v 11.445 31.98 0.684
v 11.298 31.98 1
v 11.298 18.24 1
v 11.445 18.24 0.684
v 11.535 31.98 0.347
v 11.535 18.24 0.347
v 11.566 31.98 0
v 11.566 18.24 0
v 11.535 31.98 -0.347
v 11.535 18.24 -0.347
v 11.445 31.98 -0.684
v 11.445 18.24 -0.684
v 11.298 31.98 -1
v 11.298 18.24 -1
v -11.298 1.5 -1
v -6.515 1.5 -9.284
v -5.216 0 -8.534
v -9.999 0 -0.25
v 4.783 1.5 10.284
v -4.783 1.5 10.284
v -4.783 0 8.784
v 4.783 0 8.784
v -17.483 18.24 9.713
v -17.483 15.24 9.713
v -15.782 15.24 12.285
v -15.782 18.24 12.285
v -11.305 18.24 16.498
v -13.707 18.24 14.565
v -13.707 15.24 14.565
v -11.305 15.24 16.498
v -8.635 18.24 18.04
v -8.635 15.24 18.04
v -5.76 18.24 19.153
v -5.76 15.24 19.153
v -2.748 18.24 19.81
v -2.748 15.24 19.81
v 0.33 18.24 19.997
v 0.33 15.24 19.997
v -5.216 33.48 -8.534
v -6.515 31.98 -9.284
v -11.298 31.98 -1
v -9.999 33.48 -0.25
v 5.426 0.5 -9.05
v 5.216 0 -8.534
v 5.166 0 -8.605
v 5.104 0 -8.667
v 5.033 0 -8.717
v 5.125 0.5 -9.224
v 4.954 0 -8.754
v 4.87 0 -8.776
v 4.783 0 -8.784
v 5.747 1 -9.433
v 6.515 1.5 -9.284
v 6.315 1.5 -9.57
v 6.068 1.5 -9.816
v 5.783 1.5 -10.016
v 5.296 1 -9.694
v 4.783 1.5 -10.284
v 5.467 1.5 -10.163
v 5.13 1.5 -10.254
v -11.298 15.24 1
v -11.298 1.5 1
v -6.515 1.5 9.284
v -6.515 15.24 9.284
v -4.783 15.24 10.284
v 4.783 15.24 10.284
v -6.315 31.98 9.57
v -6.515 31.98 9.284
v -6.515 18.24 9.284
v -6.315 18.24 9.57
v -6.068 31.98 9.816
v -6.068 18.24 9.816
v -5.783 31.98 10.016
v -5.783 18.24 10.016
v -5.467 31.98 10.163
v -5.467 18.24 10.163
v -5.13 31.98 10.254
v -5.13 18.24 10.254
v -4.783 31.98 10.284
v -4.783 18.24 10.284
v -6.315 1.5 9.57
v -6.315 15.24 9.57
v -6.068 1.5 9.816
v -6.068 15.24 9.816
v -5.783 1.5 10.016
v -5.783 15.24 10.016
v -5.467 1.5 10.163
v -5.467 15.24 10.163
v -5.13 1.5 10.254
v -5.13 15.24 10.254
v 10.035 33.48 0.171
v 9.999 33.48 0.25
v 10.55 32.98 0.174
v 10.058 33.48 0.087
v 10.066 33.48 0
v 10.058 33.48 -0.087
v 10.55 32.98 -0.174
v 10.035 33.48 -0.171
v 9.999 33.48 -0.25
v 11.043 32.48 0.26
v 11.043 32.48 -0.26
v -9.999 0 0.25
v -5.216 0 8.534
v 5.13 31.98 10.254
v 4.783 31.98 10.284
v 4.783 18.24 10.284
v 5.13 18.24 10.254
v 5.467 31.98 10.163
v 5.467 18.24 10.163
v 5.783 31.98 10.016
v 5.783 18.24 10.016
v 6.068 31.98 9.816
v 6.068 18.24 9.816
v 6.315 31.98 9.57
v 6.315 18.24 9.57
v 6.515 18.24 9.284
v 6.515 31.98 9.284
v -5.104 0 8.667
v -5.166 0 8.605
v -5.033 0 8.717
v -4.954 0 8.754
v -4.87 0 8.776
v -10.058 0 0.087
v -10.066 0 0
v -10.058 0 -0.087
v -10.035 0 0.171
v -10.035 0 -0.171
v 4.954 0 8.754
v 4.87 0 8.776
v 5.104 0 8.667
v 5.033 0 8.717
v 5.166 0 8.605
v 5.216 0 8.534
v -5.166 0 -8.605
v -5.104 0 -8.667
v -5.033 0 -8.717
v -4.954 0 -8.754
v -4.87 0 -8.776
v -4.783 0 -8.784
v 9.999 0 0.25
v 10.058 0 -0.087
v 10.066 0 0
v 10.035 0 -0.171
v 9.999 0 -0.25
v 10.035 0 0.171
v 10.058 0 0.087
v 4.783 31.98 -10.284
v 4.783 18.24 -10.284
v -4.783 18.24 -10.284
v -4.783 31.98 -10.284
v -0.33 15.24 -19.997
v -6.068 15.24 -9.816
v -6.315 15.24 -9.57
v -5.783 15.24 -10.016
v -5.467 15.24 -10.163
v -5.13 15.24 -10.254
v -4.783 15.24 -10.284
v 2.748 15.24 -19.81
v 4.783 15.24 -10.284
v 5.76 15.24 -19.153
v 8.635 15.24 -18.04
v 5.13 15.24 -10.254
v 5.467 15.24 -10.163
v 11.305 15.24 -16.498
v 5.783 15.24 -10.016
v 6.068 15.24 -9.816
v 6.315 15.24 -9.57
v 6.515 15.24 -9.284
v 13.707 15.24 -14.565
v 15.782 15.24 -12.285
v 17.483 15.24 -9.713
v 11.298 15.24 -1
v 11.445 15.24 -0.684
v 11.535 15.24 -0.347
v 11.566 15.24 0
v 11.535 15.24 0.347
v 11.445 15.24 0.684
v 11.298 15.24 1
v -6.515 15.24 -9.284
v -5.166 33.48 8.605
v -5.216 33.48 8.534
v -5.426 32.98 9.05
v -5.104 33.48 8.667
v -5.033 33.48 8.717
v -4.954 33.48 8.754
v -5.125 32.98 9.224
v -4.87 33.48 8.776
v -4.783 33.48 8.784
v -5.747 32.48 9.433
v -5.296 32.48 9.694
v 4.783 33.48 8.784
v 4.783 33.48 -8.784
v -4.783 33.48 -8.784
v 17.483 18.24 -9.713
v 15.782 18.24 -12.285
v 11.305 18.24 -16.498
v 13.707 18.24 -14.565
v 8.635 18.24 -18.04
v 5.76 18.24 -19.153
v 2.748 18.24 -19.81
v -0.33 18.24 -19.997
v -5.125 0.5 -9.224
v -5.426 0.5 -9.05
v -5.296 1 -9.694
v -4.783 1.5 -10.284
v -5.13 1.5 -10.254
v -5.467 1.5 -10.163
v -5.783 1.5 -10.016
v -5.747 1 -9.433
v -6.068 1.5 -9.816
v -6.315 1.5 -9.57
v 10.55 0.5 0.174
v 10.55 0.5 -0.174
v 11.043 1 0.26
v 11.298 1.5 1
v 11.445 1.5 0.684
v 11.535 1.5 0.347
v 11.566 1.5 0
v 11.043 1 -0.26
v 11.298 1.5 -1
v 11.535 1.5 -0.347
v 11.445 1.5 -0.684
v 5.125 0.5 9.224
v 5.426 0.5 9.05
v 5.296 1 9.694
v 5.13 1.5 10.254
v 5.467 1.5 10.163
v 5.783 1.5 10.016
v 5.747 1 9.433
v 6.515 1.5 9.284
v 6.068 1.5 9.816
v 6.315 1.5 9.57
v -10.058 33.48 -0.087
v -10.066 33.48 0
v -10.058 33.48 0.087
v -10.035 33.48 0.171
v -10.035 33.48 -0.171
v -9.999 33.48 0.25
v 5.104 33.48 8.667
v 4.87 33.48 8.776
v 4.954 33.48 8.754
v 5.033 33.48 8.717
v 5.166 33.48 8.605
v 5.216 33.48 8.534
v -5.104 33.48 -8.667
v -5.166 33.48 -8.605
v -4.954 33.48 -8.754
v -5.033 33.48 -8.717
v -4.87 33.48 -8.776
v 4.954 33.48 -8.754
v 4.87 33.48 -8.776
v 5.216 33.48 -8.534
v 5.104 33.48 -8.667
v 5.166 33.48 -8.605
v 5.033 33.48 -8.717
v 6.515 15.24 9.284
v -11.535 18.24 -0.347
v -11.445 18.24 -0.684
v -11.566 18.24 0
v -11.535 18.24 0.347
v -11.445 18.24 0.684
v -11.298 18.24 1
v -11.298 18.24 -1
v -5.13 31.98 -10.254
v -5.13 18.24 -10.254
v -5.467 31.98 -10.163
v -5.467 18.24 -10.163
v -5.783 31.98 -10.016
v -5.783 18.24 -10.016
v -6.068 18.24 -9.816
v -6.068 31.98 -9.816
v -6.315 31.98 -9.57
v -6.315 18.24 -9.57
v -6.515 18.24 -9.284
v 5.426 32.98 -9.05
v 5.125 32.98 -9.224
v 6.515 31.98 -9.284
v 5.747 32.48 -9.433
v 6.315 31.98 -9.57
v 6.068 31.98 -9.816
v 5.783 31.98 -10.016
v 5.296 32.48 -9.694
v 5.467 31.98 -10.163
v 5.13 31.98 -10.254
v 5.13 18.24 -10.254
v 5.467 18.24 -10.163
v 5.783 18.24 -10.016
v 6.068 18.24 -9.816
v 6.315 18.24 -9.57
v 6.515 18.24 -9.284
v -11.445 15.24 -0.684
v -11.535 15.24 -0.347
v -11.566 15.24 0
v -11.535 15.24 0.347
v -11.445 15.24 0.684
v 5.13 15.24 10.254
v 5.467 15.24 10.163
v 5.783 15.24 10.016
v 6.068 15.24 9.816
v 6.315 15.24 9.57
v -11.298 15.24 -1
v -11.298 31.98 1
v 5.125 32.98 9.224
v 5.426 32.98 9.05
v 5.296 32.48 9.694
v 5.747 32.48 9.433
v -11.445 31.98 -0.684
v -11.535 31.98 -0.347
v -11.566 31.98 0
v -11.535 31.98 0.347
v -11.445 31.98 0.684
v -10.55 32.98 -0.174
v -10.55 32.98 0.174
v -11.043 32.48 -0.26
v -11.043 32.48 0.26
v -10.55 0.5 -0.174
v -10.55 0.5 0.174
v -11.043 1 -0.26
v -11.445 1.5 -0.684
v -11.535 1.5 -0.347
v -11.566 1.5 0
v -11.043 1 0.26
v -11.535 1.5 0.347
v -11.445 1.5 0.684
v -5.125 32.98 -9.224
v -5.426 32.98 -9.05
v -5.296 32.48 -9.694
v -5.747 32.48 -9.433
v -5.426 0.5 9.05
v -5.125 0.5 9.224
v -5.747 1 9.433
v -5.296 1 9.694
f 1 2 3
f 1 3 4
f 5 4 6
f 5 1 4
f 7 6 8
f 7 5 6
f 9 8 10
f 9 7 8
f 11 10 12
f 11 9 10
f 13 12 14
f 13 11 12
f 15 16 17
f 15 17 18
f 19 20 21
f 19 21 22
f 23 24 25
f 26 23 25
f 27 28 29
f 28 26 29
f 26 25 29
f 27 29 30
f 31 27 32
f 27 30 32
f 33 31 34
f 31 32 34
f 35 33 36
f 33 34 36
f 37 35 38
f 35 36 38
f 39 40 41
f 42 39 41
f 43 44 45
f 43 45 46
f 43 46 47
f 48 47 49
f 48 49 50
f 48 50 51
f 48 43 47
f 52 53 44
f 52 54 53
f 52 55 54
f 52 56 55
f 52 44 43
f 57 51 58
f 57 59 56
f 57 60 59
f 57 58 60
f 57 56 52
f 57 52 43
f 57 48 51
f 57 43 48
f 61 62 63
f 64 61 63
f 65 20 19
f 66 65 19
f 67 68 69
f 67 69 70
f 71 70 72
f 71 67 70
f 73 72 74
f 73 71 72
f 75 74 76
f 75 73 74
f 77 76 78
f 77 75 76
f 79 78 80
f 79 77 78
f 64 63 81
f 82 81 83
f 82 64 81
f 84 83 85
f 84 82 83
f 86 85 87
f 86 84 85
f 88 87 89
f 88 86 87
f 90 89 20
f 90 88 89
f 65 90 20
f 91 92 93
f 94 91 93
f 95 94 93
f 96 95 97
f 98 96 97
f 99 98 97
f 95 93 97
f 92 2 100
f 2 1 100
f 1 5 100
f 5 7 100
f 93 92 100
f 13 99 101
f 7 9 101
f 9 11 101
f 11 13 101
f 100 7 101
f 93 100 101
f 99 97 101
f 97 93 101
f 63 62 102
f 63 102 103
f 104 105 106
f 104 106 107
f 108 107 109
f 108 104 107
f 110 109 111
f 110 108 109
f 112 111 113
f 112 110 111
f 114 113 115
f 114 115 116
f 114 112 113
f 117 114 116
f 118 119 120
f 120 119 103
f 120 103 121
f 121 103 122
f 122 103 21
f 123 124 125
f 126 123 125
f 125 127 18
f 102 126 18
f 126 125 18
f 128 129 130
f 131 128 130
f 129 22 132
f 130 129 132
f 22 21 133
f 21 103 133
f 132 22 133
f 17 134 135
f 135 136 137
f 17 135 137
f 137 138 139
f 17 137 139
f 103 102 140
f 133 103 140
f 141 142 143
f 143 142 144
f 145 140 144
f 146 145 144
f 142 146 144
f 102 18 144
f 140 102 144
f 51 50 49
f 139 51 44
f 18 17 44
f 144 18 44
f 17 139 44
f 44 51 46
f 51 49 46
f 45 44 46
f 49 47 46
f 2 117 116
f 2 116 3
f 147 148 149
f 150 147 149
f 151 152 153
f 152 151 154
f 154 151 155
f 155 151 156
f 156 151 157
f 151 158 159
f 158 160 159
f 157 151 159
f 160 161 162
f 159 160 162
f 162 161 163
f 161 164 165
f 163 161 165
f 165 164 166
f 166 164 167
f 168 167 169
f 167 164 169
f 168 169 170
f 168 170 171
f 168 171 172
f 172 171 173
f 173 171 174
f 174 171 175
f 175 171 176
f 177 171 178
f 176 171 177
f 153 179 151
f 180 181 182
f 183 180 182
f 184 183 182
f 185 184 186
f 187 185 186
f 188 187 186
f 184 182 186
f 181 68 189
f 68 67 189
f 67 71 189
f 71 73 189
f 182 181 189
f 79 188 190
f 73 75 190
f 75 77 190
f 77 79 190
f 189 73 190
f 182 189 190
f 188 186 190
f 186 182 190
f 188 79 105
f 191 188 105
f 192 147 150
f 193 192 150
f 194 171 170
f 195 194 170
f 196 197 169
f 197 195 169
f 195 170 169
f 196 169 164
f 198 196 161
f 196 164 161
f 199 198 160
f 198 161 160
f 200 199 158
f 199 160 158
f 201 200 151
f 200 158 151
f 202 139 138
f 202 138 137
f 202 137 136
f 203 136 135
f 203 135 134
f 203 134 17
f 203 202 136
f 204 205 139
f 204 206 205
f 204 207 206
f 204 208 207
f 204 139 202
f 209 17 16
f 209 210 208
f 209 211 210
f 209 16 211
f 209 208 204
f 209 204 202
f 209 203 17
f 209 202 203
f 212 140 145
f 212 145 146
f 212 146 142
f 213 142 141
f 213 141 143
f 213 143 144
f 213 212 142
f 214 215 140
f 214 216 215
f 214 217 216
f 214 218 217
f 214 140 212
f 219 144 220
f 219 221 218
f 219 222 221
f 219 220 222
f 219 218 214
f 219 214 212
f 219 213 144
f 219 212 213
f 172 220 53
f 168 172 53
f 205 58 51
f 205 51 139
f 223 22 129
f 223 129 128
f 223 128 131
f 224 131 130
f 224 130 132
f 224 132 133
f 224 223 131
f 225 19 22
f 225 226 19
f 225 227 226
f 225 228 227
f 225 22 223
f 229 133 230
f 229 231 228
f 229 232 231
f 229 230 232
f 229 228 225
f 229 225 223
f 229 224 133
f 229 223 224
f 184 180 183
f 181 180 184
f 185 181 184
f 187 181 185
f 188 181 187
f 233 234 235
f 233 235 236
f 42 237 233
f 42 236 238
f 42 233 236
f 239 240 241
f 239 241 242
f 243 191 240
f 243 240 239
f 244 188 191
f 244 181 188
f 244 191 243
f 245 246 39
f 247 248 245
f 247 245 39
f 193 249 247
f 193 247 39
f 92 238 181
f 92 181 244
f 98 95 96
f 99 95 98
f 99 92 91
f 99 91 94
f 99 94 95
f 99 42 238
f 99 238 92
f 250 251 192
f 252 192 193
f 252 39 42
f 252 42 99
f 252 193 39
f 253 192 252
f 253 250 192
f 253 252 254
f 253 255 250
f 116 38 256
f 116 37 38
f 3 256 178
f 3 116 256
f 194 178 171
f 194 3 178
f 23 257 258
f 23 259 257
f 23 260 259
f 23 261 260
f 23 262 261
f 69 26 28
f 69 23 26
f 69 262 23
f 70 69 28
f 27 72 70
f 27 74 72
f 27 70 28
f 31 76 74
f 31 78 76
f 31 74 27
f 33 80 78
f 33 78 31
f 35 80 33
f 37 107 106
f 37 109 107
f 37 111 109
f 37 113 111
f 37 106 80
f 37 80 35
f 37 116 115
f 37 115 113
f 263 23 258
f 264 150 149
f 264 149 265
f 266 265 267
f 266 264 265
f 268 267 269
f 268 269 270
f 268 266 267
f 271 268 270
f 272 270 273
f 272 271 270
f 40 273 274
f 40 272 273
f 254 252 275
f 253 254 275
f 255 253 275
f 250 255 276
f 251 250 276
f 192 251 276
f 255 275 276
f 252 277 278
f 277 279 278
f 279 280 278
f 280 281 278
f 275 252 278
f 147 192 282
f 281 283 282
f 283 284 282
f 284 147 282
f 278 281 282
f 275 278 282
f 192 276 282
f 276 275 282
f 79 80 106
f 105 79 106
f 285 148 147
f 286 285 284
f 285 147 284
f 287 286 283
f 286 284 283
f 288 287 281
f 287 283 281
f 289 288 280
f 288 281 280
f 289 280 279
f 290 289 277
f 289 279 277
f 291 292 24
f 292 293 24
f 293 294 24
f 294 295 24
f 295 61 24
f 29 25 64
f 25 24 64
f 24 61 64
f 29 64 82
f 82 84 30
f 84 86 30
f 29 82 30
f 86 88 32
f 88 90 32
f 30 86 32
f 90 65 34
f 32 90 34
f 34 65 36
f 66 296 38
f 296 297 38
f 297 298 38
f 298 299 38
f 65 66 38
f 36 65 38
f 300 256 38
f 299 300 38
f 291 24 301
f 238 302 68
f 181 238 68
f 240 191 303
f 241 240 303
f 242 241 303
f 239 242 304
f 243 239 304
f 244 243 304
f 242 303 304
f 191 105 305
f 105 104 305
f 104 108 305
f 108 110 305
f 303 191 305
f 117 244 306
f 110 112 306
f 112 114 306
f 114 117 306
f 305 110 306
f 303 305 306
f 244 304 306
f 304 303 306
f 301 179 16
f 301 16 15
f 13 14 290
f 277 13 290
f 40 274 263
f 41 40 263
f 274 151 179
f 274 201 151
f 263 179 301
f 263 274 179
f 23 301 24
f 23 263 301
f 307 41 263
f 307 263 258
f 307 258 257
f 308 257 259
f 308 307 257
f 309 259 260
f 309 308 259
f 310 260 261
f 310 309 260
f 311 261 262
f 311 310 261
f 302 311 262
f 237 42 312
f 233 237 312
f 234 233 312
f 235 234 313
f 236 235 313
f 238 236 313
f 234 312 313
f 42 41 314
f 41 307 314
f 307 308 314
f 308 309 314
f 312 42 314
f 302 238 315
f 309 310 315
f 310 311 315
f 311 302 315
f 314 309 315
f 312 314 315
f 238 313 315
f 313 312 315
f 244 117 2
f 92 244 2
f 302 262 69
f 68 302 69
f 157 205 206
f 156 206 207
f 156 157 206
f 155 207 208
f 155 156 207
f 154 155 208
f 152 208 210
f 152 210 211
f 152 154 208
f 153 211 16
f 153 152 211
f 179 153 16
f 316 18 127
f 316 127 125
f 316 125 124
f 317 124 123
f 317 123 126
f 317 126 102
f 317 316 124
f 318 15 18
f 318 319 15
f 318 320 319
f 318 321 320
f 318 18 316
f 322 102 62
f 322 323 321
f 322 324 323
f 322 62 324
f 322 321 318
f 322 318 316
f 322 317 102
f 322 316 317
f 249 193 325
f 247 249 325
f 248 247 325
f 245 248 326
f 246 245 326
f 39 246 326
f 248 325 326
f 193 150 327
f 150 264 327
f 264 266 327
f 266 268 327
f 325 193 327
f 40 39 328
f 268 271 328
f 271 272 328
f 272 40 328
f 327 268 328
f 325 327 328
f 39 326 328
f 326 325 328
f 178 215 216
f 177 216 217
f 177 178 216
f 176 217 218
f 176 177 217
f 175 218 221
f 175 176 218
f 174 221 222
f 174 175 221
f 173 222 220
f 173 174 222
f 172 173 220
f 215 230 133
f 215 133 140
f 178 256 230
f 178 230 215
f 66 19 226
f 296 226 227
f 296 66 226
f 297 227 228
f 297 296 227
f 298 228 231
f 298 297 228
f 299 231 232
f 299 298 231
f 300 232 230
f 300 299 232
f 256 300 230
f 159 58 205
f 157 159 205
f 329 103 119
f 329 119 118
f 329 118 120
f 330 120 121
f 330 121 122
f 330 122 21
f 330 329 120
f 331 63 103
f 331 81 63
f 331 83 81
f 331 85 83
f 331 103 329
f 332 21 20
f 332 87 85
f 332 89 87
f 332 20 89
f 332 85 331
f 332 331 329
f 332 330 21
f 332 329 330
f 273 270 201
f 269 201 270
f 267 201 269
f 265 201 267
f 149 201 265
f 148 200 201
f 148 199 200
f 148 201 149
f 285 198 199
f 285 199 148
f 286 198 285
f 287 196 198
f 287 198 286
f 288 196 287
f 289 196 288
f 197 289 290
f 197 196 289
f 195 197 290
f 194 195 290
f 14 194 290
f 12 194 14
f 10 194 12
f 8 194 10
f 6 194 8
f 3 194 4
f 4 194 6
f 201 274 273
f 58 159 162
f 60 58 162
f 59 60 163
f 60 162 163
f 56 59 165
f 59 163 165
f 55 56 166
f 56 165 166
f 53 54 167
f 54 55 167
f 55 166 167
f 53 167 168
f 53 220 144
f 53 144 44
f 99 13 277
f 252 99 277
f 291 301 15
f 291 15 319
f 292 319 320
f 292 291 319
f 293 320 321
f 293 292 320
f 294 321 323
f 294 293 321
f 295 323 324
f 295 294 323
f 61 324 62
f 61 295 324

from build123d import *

# Parameters (mm, degrees)
BOSS_EXTRUDE1_DEPTH = 15.24
SKETCH2_R           = 20
BOSS_EXTRUDE2_DEPTH = 3
BOSS_EXTRUDE3_START = 18.24
BOSS_EXTRUDE3_DEPTH = 15.24
FILLET1_R           = 2
SKETCH3_W           = 35.8896148
SKETCH3_H           = 21.37412809
CUT_EXTRUDE1_DEPTH  = 51.878317112
CHAMFER2_SIZE       = 1.5
SKETCH5_W           = 51.439810339
SKETCH5_H           = 15.927026311
CUT_EXTRUDE3_DEPTH  = 50.49162642


with BuildPart() as part:
    # Sketch1 → Boss-Extrude1 (new body)
    with BuildSketch(Plane(origin=(0, 0, 0), x_dir=(1, 0, 0), z_dir=(0, 1, 0))):
        Polygon((5.9375, 10.28405167), (-5.9375, 10.28405167), (-11.875, 0), (-5.9375, -10.28405167), (5.9375, -10.28405167), (11.875, 0), align=None)
    extrude(amount=BOSS_EXTRUDE1_DEPTH)

    # Sketch2 → Boss-Extrude2 (add)
    with BuildSketch(Plane(origin=(0, 15.24, 0), x_dir=(1, 0, 0), z_dir=(0, 1, 0))):
        with Locations(Location((0, 0, 0), (0, 0, 270))):
            Circle(SKETCH2_R)
    extrude(amount=BOSS_EXTRUDE2_DEPTH)

    # Sketch1<2> → Boss-Extrude3 (add)
    with BuildSketch(Plane(origin=(0, 0, 0), x_dir=(1, 0, 0), z_dir=(0, 1, 0)).offset(BOSS_EXTRUDE3_START)):
        Polygon((5.9375, 10.28405167), (-5.9375, 10.28405167), (-11.875, 0), (-5.9375, -10.28405167), (5.9375, -10.28405167), (11.875, 0), align=None)
    extrude(amount=BOSS_EXTRUDE3_DEPTH)

    # Fillet1
    fillet1_edges = [part.edges().sort_by_distance(p)[0] for p in [
        (11.875, 7.62, 0),
        (5.9375, 7.62, 10.28405167),
        (-5.9375, 7.62, 10.28405167),
        (-11.875, 7.62, 0),
        (-5.9375, 7.62, -10.28405167),
        (5.9375, 7.62, -10.28405167),
        (-5.9375, 25.86, 10.28405167),
        (5.9375, 25.86, 10.28405167),
        (11.875, 25.86, 0),
        (5.9375, 25.86, -10.28405167),
        (-5.9375, 25.86, -10.28405167),
        (-11.875, 25.86, 0),
    ]]
    fillet(fillet1_edges, radius=FILLET1_R)

    # Sketch3 → Cut-Extrude1 (cut, through all)
    with BuildSketch(Plane(origin=(-8.90625, 0, -5.142025835), x_dir=(-0.5000000000000004, 0, 0.8660254037844385), z_dir=(-0.8660254037844384, 0, -0.5000000000000003))):
        with Locations((0.576480633, 22.756432149)):
            Rectangle(SKETCH3_W, SKETCH3_H)
    extrude(amount=CUT_EXTRUDE1_DEPTH, mode=Mode.SUBTRACT)

    # Chamfer2
    chamfer2_edges = [part.edges().sort_by_distance(p)[0] for p in [
        (0, 0, -10.28405167),
        (8.90625, 0, -5.142025835),
        (8.90625, 0, 5.142025835),
        (0, 0, 10.28405167),
        (-8.90625, 0, 5.142025835),
        (-8.90625, 0, -5.142025835),
        (11.565598923, 0, 0),
        (5.782799462, 0, 10.016102478),
        (-5.782799462, 0, 10.016102478),
        (-11.565598923, 0, 0),
        (-5.782799462, 0, -10.016102478),
        (5.782799462, 0, -10.016102478),
        (0, 33.48, -10.28405167),
        (8.90625, 33.48, -5.142025835),
        (0, 33.48, 10.28405167),
        (8.90625, 33.48, 5.142025835),
        (-8.90625, 33.48, -5.142025835),
        (-8.90625, 33.48, 5.142025835),
        (11.565598923, 33.48, 0),
        (5.782799462, 33.48, 10.016102478),
        (-5.782799462, 33.48, 10.016102478),
        (-11.565598923, 33.48, 0),
        (-5.782799462, 33.48, -10.016102478),
        (5.782799462, 33.48, -10.016102478),
    ]]
    chamfer(chamfer2_edges, length=CHAMFER2_SIZE)

    # Sketch5 → Cut-Extrude3 (cut, through all)
    with BuildSketch(Plane(origin=(8.90625, 0, 5.142025835), x_dir=(0.5000000000000004, 0, -0.8660254037844384), z_dir=(0.8660254037844384, 0, 0.5000000000000004))):
        with Locations((-1.041050082, 20.809011755)):
            Rectangle(SKETCH5_W, SKETCH5_H)
    extrude(amount=CUT_EXTRUDE3_DEPTH, mode=Mode.SUBTRACT)


solid = part.part
